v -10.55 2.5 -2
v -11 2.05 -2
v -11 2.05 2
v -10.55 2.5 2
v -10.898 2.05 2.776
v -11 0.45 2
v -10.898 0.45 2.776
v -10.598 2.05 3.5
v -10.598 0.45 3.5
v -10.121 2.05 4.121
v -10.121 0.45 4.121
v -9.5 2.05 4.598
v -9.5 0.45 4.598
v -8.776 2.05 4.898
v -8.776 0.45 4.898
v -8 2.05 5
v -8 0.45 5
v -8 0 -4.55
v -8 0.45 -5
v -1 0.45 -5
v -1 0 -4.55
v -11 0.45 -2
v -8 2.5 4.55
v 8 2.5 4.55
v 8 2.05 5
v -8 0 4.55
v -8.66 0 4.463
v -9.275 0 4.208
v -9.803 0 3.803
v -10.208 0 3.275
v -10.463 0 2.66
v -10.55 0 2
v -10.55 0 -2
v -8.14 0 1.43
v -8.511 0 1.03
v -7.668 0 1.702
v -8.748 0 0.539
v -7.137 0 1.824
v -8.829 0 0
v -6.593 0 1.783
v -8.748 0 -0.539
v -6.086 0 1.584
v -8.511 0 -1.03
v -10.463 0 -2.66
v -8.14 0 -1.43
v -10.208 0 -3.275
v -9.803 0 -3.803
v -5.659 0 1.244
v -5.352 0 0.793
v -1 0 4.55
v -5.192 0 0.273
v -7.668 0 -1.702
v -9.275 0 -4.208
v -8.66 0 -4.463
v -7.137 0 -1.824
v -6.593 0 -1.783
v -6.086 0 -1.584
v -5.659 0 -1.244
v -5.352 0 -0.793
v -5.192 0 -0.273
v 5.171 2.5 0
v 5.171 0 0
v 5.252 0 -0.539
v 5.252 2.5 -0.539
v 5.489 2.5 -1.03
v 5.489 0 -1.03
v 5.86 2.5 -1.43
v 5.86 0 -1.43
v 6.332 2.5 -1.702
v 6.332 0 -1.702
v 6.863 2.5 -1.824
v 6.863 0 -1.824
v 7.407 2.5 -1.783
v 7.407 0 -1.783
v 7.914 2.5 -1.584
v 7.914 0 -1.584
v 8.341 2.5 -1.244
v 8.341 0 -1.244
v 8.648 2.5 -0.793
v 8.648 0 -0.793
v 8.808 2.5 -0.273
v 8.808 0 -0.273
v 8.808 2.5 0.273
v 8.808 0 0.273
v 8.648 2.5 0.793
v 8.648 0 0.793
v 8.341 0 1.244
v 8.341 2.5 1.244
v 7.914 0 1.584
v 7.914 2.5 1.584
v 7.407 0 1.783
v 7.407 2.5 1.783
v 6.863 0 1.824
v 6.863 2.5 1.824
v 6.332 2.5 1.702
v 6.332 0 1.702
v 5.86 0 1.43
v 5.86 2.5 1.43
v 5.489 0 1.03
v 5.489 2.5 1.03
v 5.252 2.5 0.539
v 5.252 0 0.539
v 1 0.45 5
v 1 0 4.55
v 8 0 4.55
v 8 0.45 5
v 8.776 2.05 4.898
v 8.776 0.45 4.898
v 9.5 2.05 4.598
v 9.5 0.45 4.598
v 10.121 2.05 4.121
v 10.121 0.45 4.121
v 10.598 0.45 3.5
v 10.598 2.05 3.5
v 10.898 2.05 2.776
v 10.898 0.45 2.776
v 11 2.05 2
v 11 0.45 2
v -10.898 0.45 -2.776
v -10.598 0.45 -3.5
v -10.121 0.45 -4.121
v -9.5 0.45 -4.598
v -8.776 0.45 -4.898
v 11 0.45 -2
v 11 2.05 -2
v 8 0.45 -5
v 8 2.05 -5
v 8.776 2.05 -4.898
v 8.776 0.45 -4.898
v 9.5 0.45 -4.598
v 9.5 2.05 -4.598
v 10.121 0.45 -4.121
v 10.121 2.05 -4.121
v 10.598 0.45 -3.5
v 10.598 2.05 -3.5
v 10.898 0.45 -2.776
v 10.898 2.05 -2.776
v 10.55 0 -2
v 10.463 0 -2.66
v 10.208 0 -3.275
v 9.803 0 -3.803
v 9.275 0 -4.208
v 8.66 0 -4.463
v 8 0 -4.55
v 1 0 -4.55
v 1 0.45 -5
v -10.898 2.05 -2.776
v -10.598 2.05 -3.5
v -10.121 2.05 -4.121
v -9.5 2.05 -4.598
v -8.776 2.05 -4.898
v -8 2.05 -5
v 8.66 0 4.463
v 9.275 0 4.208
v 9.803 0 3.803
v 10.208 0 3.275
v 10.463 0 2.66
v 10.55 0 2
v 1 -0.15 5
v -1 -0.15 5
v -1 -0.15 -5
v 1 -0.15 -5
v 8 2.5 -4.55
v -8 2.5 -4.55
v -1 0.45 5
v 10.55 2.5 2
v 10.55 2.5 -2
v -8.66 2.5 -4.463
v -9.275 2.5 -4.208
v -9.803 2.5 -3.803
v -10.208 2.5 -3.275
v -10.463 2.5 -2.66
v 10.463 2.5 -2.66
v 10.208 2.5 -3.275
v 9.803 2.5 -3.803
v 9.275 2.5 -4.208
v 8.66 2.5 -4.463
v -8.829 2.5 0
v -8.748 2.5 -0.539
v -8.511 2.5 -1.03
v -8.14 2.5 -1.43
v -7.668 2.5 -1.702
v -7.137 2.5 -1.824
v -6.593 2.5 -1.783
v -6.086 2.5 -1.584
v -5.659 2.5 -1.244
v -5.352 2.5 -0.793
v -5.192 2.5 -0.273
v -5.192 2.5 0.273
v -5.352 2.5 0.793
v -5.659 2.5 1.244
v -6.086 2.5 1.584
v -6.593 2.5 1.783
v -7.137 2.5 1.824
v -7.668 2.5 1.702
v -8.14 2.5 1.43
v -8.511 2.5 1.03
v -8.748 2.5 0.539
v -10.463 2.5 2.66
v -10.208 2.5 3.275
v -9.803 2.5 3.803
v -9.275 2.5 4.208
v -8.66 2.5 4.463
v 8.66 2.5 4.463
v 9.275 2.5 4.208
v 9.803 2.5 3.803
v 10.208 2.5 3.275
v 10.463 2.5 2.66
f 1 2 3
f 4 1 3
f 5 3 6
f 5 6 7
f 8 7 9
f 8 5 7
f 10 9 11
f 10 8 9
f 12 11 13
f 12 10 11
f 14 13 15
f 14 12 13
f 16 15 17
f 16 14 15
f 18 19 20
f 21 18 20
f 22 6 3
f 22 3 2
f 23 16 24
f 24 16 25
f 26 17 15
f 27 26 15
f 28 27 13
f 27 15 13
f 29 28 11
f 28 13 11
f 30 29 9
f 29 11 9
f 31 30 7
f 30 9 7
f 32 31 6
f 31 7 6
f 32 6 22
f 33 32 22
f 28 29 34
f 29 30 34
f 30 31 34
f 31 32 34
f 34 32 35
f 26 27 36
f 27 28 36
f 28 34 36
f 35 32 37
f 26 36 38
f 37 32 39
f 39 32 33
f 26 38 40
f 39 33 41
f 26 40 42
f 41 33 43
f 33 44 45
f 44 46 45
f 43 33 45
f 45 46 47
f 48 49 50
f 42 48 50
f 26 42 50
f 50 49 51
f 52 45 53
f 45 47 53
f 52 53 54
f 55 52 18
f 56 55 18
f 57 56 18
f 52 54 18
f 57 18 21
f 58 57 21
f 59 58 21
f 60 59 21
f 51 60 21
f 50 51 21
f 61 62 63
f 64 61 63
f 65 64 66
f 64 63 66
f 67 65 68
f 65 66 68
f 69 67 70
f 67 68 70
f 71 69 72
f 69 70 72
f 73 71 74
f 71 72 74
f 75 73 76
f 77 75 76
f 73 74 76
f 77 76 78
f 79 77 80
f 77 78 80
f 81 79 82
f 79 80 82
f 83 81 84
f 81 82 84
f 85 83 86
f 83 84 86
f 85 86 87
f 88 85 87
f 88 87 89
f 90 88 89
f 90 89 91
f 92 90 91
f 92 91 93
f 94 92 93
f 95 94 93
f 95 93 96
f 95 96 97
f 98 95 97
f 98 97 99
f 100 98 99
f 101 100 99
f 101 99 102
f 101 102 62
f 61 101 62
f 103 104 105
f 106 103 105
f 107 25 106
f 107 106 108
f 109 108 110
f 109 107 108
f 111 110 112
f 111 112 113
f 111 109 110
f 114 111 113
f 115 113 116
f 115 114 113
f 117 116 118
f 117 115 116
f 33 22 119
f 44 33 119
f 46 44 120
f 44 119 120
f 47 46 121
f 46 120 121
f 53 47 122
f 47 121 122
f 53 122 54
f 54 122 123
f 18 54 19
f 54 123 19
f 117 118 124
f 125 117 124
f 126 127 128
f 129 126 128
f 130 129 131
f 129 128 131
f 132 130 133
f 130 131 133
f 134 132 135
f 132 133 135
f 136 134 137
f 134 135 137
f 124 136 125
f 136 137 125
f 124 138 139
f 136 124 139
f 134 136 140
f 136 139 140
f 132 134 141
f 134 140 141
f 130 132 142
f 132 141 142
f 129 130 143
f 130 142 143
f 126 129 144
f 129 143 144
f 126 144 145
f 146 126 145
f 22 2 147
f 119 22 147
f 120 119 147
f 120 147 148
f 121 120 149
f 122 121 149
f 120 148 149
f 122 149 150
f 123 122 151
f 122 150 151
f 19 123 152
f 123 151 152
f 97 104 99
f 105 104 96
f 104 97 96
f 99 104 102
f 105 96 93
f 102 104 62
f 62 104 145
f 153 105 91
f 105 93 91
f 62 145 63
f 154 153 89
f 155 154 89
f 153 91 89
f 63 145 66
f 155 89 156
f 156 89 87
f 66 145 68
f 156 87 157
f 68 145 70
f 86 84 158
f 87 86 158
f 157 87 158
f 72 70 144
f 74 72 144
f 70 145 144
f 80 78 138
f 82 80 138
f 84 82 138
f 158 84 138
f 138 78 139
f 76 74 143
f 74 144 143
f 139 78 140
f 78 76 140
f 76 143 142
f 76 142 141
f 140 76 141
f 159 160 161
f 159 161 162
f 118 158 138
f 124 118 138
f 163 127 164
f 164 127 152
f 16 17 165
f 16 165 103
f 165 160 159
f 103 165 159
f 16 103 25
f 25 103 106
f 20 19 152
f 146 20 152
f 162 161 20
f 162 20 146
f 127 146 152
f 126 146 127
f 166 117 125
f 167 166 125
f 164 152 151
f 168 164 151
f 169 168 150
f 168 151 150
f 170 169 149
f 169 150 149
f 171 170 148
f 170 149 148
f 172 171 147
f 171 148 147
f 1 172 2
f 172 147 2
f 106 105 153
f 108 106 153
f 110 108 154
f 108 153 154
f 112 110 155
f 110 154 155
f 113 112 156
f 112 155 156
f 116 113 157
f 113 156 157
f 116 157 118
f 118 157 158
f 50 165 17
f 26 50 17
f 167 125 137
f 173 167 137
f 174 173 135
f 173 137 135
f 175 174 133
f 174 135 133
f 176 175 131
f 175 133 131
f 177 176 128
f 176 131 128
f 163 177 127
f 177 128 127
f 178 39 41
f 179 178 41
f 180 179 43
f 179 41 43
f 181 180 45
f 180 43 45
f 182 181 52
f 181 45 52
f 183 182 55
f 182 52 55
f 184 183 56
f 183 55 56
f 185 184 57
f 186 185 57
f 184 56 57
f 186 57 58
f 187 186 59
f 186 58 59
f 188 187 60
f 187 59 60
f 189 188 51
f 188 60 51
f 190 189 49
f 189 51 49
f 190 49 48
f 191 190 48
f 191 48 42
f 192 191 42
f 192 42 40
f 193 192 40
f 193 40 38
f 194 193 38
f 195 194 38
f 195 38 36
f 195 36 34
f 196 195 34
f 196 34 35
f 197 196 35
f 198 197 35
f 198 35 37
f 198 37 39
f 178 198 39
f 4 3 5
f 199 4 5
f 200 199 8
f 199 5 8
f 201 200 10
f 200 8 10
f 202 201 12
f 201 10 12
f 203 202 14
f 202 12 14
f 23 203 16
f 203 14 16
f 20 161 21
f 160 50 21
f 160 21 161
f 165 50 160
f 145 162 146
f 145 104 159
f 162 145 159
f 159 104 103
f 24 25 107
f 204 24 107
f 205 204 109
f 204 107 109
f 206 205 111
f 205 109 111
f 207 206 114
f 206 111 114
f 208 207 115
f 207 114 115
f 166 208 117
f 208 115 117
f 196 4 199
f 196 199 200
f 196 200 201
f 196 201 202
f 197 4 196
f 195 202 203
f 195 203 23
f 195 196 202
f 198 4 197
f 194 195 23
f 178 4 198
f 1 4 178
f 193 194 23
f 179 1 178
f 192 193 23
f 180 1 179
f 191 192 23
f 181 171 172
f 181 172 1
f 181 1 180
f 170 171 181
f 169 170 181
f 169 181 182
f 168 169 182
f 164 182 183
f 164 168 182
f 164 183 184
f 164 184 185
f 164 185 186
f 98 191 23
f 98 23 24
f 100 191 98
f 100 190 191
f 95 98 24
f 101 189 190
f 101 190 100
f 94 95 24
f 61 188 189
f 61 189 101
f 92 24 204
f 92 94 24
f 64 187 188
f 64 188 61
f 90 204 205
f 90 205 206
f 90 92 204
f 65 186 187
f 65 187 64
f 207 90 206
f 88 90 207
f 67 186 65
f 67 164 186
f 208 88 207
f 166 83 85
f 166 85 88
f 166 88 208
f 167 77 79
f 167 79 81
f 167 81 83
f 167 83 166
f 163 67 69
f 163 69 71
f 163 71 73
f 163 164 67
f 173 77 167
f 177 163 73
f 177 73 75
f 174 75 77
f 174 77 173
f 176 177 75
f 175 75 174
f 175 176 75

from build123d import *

# Parameters (mm, degrees)
SKETCH1_W             = 22
SKETCH1_H             = 10
BOSS_EXTRUDE1_DEPTH   = 2.5
F_6_CLEARANCE_HOLE1_D = 3.6576
SKETCH4_W             = 2
SKETCH4_H             = 10
BOSS_EXTRUDE2_DEPTH   = 0.15
FILLET1_R             = 3
CHAMFER1_SIZE         = 0.45


with BuildPart() as part:
    # Sketch1 → Boss-Extrude1 (new body)
    with BuildSketch(Plane(origin=(0, 0, 0), x_dir=(1, 0, 0), z_dir=(0, 1, 0))):
        Rectangle(SKETCH1_W, SKETCH1_H)
    extrude(amount=BOSS_EXTRUDE1_DEPTH)

    # #6 Clearance Hole1 (through all)
    with Locations(Plane(origin=(0, 2.5, 0), x_dir=(1, 0, 0), z_dir=(0, 1, 0))):
        with Locations((7, 0), (-7, 0)):
            Hole(F_6_CLEARANCE_HOLE1_D / 2)

    # Sketch4 → Boss-Extrude2 (add)
    with BuildSketch(Plane.XZ):
        Rectangle(SKETCH4_W, SKETCH4_H)
    extrude(amount=BOSS_EXTRUDE2_DEPTH)

    # Fillet1
    fillet1_edges = [part.edges().sort_by_distance(p)[0] for p in [
        (11, 1.25, 5),
        (-11, 1.25, 5),
        (-11, 1.25, -5),
        (11, 1.25, -5),
    ]]
    fillet(fillet1_edges, radius=FILLET1_R)

    # Chamfer1
    chamfer1_edges = [part.edges().sort_by_distance(p)[0] for p in [
        (4.5, 0, 5),
        (-4.5, 0, -5),
        (11, 0, 0),
        (11, 2.5, 0),
        (4.5, 0, -5),
        (10.121320344, 0, -4.121320344),
        (10.121320344, 0, 4.121320344),
        (-4.5, 0, 5),
        (0, 2.5, 5),
        (0, 2.5, -5),
        (-11, 2.5, 0),
        (-10.121320344, 2.5, 4.121320344),
        (-10.121320344, 2.5, -4.121320344),
        (10.121320344, 2.5, -4.121320344),
        (10.121320344, 2.5, 4.121320344),
        (-11, 0, 0),
        (-10.121320344, 0, 4.121320344),
        (-10.121320344, 0, -4.121320344),
    ]]
    chamfer(chamfer1_edges, length=CHAMFER1_SIZE)


solid = part.part
